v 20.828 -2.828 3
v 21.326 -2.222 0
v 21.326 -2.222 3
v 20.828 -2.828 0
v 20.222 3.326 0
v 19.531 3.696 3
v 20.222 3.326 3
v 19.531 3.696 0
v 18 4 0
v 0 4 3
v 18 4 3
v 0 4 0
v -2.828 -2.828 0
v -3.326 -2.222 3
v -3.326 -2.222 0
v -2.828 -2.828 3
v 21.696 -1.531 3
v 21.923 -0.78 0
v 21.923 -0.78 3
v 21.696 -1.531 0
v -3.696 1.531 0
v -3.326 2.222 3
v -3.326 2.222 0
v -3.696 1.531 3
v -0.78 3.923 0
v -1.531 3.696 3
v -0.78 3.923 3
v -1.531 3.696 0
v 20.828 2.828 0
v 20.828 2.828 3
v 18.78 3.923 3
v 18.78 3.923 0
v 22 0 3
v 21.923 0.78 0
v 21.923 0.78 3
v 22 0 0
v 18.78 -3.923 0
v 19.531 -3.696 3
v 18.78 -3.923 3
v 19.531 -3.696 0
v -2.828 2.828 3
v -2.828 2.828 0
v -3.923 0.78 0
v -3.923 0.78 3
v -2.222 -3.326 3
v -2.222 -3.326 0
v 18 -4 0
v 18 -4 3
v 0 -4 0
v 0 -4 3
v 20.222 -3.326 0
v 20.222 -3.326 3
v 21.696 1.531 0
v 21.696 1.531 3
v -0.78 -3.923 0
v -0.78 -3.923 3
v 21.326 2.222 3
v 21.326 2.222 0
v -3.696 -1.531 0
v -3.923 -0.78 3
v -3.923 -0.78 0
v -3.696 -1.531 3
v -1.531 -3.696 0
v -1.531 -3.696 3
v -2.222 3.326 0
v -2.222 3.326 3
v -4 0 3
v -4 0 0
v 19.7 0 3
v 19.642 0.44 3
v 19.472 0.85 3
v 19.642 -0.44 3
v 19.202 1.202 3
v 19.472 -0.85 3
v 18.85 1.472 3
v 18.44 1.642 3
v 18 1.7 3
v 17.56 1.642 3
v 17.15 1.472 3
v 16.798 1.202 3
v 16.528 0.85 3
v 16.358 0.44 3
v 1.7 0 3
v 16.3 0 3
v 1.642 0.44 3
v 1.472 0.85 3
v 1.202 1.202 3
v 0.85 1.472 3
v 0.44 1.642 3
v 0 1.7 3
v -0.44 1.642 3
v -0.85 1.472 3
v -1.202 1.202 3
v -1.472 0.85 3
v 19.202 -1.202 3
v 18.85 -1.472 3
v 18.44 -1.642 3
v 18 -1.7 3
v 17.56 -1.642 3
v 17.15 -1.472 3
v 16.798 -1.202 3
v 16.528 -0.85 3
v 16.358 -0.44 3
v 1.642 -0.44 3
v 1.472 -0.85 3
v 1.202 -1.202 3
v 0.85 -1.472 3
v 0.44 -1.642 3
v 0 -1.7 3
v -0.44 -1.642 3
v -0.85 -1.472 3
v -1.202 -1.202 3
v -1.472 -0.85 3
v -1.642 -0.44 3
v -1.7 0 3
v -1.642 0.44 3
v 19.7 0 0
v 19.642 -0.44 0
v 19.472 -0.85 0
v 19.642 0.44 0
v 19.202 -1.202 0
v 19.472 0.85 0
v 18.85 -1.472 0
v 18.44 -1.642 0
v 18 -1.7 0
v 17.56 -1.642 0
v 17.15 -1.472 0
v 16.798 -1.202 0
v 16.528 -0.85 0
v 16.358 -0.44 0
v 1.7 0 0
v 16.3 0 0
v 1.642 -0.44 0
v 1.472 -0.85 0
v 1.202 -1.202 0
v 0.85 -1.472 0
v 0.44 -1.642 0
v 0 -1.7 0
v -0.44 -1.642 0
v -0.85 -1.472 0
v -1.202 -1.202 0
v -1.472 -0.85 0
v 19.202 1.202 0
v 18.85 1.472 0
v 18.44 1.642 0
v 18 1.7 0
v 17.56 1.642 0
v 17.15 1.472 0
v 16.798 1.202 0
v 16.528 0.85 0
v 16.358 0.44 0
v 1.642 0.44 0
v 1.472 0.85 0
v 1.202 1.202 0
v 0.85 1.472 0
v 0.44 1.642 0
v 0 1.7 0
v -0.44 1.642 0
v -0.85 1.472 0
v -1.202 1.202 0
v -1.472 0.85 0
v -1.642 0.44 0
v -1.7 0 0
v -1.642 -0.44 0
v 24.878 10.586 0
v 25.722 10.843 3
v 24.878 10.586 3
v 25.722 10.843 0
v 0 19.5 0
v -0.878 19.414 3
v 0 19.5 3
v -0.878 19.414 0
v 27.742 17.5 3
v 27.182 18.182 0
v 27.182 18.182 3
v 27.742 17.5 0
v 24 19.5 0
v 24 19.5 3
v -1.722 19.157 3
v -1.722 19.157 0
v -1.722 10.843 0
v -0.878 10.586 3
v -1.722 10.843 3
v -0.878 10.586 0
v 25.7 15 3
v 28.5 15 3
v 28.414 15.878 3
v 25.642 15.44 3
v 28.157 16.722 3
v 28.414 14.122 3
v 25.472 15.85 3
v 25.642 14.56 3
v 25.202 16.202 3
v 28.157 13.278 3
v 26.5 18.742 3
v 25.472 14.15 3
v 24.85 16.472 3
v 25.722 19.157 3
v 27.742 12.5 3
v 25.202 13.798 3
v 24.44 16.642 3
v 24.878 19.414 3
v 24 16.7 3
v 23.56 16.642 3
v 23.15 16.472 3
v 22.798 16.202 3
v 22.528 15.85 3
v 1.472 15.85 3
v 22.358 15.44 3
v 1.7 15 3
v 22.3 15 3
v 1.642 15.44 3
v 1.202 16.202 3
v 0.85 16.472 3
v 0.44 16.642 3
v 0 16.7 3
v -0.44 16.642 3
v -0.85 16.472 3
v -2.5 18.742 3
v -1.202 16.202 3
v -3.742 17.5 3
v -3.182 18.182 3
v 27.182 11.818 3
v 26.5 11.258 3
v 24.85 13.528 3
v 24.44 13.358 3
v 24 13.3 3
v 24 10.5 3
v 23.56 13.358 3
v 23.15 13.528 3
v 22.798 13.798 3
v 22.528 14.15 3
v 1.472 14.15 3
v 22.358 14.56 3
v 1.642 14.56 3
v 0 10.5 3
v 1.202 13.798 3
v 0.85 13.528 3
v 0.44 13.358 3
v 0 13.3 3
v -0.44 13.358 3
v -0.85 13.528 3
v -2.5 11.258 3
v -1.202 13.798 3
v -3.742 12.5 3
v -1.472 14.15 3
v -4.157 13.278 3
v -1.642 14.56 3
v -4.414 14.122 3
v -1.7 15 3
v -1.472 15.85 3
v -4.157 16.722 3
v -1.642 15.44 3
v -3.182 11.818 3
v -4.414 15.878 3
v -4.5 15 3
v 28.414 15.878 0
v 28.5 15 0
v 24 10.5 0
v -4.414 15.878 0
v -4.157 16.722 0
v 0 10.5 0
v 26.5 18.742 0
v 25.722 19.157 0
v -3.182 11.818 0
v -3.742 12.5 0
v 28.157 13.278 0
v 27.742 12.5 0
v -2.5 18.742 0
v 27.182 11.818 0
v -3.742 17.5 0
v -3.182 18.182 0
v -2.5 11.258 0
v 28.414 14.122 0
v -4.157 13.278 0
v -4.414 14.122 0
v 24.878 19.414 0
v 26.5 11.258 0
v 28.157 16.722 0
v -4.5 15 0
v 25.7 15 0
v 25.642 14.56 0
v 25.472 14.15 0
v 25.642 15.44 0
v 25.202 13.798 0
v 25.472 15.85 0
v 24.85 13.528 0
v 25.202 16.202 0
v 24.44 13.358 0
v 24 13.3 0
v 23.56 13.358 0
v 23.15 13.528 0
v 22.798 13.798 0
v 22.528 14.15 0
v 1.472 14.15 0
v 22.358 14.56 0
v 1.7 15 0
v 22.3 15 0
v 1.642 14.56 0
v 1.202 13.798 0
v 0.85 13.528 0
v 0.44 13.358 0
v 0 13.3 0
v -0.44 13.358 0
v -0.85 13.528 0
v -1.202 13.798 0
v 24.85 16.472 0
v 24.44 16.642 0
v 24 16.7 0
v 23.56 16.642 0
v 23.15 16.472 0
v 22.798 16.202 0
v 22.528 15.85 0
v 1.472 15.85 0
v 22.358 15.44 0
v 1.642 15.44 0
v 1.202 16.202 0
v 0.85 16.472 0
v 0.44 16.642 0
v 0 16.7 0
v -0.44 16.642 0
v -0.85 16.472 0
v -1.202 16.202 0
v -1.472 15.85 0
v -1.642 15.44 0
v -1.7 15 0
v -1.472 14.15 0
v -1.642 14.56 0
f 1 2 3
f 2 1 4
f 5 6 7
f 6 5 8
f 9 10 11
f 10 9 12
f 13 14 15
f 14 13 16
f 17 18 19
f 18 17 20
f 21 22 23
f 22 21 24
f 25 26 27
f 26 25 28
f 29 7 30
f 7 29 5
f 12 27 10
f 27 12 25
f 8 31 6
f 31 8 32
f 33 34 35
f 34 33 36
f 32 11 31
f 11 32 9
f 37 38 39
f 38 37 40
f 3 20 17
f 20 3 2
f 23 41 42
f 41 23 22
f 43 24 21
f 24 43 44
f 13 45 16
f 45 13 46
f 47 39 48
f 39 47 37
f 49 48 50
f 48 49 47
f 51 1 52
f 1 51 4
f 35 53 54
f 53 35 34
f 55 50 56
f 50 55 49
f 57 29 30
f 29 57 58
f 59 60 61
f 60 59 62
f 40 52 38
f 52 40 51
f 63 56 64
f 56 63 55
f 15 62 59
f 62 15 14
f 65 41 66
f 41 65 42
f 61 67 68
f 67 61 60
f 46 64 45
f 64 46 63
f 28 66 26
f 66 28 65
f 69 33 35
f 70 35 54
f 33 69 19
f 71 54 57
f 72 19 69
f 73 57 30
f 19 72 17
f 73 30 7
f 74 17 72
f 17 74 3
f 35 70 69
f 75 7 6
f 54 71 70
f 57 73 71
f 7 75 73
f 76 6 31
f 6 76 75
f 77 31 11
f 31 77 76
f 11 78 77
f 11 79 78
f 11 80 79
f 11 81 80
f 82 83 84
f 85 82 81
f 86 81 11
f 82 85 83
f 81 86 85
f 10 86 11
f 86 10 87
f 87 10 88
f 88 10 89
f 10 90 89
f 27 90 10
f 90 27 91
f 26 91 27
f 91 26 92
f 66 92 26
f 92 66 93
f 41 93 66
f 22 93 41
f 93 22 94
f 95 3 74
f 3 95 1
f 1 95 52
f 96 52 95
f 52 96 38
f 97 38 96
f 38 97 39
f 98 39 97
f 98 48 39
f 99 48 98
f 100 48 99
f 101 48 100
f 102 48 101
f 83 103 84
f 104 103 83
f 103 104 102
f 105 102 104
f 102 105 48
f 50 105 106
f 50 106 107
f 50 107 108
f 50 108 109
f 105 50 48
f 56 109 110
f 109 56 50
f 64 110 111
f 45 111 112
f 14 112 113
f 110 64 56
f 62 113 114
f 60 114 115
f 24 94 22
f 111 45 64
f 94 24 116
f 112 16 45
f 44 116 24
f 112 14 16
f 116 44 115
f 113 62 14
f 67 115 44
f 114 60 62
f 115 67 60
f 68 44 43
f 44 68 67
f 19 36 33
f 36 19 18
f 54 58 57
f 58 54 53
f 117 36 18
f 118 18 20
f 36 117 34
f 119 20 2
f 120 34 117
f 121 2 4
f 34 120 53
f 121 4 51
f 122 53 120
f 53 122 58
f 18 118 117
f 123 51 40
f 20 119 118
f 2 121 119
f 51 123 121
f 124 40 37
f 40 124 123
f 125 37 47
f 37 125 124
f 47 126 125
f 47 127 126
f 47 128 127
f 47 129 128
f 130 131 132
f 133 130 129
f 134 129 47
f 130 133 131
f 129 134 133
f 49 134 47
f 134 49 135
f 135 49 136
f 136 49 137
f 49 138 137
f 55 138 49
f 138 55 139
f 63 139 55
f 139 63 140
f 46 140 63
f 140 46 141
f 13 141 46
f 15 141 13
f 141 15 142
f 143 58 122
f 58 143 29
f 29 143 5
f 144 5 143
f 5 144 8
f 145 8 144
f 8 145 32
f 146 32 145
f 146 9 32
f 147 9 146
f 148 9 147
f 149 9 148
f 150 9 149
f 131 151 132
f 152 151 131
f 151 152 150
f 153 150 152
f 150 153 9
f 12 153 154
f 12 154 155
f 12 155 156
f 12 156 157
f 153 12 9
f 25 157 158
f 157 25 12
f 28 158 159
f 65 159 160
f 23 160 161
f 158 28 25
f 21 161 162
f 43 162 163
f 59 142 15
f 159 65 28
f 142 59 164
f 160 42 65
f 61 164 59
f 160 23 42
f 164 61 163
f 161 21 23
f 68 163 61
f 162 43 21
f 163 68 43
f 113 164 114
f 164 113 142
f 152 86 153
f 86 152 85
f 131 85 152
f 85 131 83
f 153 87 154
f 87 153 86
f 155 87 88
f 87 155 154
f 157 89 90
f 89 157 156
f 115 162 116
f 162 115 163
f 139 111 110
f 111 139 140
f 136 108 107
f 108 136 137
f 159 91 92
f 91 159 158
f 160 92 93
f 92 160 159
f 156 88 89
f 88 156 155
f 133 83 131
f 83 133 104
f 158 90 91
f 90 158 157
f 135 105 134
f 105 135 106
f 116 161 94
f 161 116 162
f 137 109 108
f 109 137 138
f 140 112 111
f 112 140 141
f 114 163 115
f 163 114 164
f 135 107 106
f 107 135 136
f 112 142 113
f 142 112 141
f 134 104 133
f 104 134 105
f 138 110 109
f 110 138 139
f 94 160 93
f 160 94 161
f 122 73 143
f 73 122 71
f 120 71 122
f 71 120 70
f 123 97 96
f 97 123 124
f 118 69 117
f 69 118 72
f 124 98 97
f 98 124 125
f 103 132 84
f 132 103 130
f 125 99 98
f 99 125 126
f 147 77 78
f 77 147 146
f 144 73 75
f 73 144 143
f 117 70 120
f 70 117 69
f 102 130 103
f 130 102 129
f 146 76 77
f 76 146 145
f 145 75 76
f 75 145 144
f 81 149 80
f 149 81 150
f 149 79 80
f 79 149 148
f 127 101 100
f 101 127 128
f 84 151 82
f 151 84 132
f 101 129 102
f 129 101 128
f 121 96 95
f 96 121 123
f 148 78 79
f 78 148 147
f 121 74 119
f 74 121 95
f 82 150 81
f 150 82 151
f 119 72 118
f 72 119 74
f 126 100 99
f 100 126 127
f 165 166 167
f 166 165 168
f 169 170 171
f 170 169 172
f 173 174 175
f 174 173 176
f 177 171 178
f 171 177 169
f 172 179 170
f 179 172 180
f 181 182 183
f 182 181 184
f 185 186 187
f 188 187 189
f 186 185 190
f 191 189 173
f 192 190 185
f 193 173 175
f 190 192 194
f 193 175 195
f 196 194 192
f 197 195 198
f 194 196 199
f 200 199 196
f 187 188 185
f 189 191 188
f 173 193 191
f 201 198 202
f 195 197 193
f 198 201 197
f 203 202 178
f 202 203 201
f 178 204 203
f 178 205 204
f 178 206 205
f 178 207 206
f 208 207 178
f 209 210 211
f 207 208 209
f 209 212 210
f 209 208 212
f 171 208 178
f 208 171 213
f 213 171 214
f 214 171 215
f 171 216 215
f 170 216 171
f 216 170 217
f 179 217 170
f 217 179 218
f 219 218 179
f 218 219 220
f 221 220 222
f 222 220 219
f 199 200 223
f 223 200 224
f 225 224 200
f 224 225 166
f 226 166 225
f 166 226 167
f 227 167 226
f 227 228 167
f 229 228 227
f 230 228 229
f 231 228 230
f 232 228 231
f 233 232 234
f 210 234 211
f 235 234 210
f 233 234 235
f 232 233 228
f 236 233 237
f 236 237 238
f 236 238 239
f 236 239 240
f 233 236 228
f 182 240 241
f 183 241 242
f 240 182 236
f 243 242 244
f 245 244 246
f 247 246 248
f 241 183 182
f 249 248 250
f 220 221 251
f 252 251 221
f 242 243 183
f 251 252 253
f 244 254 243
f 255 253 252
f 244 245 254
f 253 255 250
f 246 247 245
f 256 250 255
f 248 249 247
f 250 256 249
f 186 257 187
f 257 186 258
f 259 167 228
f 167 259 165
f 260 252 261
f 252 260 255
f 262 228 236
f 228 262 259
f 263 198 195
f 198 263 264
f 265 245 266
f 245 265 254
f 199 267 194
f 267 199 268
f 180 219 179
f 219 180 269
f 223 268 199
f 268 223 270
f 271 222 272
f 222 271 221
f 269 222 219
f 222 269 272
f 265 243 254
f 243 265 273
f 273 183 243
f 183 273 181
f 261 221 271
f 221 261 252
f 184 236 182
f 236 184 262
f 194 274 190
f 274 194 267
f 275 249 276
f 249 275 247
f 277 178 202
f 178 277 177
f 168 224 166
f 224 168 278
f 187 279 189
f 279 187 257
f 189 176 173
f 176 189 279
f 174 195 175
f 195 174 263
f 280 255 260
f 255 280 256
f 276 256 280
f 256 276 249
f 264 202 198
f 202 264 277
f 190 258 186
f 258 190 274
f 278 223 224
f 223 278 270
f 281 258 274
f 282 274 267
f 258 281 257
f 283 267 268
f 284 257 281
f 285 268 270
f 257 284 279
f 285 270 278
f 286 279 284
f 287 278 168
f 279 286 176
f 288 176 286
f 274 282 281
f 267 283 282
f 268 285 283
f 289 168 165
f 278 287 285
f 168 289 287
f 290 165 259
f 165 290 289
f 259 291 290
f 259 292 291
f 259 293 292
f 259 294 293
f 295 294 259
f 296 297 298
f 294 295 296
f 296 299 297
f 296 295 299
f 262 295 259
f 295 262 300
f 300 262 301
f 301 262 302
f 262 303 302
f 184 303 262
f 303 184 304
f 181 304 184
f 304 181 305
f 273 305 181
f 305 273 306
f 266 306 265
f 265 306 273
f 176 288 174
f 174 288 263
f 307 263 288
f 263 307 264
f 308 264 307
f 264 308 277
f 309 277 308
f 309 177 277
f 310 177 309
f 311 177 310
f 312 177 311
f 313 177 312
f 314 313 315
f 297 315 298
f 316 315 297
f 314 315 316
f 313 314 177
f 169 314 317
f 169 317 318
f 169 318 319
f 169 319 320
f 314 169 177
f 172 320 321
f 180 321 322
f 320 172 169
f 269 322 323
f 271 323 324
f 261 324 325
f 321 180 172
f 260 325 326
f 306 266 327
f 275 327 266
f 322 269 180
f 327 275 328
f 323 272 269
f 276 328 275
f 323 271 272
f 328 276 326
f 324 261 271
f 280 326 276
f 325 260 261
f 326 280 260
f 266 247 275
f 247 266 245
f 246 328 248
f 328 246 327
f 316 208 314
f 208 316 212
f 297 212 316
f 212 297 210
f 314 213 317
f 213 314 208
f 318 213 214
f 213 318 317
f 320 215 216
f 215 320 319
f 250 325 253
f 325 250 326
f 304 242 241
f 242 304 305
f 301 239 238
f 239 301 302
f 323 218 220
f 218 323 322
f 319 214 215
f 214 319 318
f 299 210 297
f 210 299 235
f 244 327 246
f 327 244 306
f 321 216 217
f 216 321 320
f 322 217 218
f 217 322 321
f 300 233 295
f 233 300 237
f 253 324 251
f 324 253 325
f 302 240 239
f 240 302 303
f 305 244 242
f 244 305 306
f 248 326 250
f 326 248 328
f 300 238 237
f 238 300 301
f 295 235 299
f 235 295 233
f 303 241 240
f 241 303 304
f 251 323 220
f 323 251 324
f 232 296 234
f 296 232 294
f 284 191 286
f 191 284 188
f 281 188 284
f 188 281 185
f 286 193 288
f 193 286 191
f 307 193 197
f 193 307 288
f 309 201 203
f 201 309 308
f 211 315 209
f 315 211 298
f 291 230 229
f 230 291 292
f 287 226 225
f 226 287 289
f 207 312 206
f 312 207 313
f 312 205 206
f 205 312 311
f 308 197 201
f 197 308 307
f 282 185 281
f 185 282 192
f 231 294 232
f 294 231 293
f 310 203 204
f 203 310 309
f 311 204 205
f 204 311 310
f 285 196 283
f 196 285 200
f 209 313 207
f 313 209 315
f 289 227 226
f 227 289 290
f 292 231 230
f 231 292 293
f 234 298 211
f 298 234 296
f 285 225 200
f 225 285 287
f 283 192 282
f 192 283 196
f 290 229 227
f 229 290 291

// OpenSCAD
// CONNECTING ROD MODULE
// For Starry Night Wave Surge Mechanism
// Parametric connecting rod for slider-crank motion
//
// Creates link between eccentric pin and pivot bracket
// Two variants: Zone 2 (18mm) and Zone 3 (24mm)
//
// FDM Tolerances (from research):
//   - Pin holes: 3.4mm for 3mm pins (0.4mm clearance)
//   - Wall around holes: 2mm minimum
//   - Rod thickness: 3mm (printable, strong)

// === PARAMETERS ===

// Zone 2 Rod (Mid Ocean - moderate surge)
ZONE2_ROD_LENGTH = 18;     // mm center-to-center
ZONE2_ROD_WIDTH = 4;       // mm (slightly smaller)

// Zone 3 Rod (Breaking Wave - dramatic surge)
ZONE3_ROD_LENGTH = 24;     // mm center-to-center
ZONE3_ROD_WIDTH = 5;       // mm (structural)

// Common parameters
ROD_THICKNESS = 3;         // mm
PIN_DIAMETER = 3;          // mm
HOLE_CLEARANCE = 0.4;      // mm (FDM tolerance)
HOLE_DIAMETER = PIN_DIAMETER + HOLE_CLEARANCE;  // 3.4mm
WALL_THICKNESS = 2;        // mm minimum around holes

// Colors
C_ROD = [0.85, 0.85, 0.80];  // Light gear color

// === MODULES ===

module connecting_rod(length, width) {
    // Parametric connecting rod with rounded ends
    // length = center-to-center distance
    // width = rod body width

    end_diameter = width + 2 * WALL_THICKNESS;  // Diameter at hole ends

    color(C_ROD)
    difference() {
        // Rod body with rounded ends
        hull() {
            // End 1 (eccentric pin end)
            cylinder(d=end_diameter, h=ROD_THICKNESS, $fn=32);

            // End 2 (pivot end)
            translate([length, 0, 0])
                cylinder(d=end_diameter, h=ROD_THICKNESS, $fn=32);
        }

        // Hole 1 (eccentric pin)
        translate([0, 0, -1])
            cylinder(d=HOLE_DIAMETER, h=ROD_THICKNESS+2, $fn=24);

        // Hole 2 (pivot)
        translate([length, 0, -1])
            cylinder(d=HOLE_DIAMETER, h=ROD_THICKNESS+2, $fn=24);
    }
}

// Zone-specific convenience modules
module zone2_connecting_rod() {
    connecting_rod(ZONE2_ROD_LENGTH, ZONE2_ROD_WIDTH);
}

module zone3_connecting_rod() {
    connecting_rod(ZONE3_ROD_LENGTH, ZONE3_ROD_WIDTH);
}

// Rod positioned in 3D space based on kinematics
module connecting_rod_positioned(length, width, eccentric_pos, pivot_pos) {
    // Calculate rod orientation from eccentric pin to pivot
    // eccentric_pos = [x, y, z] of eccentric pin center
    // pivot_pos = [x, y, z] of pivot center

    dx = pivot_pos[0] - eccentric_pos[0];
    dy = pivot_pos[1] - eccentric_pos[1];
    dz = pivot_pos[2] - eccentric_pos[2];

    // Calculate angles
    xy_angle = atan2(dy, dx);
    xy_dist = sqrt(dx*dx + dy*dy);
    z_angle = atan2(dz, xy_dist);

    translate(eccentric_pos)
        rotate([0, 0, xy_angle])
            rotate([z_angle, 0, 0])
                connecting_rod(length, width);
}

// === KINEMATIC HELPER FUNCTIONS ===

// Calculate vertical component of slider-crank position
// Returns height offset from base
function calc_slider_crank_height(theta, eccentric_r, rod_len) =
    let(
        pin_x = eccentric_r * sin(theta),
        pin_y = eccentric_r * cos(theta),
        // Vertical component considering rod length constraint
        rod_vertical = sqrt(max(0, rod_len*rod_len - pin_x*pin_x))
    )
    pin_y + rod_vertical;

// Calculate rod angle for animation
function calc_rod_swing_angle(theta, eccentric_r, rod_len) =
    let(
        pin_x = eccentric_r * sin(theta)
    )
    asin(clamp(pin_x / rod_len, -1, 1));

// Clamp function for safety
function clamp(val, min_val, max_val) =
    max(min_val, min(max_val, val));

// === TEST RENDER ===

// Show both rod variants side by side
translate([0, 0, 0])
    zone2_connecting_rod();

translate([0, 15, 0])
    zone3_connecting_rod();

// Labels (for reference - remove in production)
// translate([9, -3, 0]) text("Zone 2: 18mm", size=2);
// translate([12, 12, 0]) text("Zone 3: 24mm", size=2);

// Animation test - rod swinging (uncomment)
// angle = sin($t * 360) * 20;  // +/-20 degree swing
// rotate([0, 0, angle])
//     zone3_connecting_rod();
